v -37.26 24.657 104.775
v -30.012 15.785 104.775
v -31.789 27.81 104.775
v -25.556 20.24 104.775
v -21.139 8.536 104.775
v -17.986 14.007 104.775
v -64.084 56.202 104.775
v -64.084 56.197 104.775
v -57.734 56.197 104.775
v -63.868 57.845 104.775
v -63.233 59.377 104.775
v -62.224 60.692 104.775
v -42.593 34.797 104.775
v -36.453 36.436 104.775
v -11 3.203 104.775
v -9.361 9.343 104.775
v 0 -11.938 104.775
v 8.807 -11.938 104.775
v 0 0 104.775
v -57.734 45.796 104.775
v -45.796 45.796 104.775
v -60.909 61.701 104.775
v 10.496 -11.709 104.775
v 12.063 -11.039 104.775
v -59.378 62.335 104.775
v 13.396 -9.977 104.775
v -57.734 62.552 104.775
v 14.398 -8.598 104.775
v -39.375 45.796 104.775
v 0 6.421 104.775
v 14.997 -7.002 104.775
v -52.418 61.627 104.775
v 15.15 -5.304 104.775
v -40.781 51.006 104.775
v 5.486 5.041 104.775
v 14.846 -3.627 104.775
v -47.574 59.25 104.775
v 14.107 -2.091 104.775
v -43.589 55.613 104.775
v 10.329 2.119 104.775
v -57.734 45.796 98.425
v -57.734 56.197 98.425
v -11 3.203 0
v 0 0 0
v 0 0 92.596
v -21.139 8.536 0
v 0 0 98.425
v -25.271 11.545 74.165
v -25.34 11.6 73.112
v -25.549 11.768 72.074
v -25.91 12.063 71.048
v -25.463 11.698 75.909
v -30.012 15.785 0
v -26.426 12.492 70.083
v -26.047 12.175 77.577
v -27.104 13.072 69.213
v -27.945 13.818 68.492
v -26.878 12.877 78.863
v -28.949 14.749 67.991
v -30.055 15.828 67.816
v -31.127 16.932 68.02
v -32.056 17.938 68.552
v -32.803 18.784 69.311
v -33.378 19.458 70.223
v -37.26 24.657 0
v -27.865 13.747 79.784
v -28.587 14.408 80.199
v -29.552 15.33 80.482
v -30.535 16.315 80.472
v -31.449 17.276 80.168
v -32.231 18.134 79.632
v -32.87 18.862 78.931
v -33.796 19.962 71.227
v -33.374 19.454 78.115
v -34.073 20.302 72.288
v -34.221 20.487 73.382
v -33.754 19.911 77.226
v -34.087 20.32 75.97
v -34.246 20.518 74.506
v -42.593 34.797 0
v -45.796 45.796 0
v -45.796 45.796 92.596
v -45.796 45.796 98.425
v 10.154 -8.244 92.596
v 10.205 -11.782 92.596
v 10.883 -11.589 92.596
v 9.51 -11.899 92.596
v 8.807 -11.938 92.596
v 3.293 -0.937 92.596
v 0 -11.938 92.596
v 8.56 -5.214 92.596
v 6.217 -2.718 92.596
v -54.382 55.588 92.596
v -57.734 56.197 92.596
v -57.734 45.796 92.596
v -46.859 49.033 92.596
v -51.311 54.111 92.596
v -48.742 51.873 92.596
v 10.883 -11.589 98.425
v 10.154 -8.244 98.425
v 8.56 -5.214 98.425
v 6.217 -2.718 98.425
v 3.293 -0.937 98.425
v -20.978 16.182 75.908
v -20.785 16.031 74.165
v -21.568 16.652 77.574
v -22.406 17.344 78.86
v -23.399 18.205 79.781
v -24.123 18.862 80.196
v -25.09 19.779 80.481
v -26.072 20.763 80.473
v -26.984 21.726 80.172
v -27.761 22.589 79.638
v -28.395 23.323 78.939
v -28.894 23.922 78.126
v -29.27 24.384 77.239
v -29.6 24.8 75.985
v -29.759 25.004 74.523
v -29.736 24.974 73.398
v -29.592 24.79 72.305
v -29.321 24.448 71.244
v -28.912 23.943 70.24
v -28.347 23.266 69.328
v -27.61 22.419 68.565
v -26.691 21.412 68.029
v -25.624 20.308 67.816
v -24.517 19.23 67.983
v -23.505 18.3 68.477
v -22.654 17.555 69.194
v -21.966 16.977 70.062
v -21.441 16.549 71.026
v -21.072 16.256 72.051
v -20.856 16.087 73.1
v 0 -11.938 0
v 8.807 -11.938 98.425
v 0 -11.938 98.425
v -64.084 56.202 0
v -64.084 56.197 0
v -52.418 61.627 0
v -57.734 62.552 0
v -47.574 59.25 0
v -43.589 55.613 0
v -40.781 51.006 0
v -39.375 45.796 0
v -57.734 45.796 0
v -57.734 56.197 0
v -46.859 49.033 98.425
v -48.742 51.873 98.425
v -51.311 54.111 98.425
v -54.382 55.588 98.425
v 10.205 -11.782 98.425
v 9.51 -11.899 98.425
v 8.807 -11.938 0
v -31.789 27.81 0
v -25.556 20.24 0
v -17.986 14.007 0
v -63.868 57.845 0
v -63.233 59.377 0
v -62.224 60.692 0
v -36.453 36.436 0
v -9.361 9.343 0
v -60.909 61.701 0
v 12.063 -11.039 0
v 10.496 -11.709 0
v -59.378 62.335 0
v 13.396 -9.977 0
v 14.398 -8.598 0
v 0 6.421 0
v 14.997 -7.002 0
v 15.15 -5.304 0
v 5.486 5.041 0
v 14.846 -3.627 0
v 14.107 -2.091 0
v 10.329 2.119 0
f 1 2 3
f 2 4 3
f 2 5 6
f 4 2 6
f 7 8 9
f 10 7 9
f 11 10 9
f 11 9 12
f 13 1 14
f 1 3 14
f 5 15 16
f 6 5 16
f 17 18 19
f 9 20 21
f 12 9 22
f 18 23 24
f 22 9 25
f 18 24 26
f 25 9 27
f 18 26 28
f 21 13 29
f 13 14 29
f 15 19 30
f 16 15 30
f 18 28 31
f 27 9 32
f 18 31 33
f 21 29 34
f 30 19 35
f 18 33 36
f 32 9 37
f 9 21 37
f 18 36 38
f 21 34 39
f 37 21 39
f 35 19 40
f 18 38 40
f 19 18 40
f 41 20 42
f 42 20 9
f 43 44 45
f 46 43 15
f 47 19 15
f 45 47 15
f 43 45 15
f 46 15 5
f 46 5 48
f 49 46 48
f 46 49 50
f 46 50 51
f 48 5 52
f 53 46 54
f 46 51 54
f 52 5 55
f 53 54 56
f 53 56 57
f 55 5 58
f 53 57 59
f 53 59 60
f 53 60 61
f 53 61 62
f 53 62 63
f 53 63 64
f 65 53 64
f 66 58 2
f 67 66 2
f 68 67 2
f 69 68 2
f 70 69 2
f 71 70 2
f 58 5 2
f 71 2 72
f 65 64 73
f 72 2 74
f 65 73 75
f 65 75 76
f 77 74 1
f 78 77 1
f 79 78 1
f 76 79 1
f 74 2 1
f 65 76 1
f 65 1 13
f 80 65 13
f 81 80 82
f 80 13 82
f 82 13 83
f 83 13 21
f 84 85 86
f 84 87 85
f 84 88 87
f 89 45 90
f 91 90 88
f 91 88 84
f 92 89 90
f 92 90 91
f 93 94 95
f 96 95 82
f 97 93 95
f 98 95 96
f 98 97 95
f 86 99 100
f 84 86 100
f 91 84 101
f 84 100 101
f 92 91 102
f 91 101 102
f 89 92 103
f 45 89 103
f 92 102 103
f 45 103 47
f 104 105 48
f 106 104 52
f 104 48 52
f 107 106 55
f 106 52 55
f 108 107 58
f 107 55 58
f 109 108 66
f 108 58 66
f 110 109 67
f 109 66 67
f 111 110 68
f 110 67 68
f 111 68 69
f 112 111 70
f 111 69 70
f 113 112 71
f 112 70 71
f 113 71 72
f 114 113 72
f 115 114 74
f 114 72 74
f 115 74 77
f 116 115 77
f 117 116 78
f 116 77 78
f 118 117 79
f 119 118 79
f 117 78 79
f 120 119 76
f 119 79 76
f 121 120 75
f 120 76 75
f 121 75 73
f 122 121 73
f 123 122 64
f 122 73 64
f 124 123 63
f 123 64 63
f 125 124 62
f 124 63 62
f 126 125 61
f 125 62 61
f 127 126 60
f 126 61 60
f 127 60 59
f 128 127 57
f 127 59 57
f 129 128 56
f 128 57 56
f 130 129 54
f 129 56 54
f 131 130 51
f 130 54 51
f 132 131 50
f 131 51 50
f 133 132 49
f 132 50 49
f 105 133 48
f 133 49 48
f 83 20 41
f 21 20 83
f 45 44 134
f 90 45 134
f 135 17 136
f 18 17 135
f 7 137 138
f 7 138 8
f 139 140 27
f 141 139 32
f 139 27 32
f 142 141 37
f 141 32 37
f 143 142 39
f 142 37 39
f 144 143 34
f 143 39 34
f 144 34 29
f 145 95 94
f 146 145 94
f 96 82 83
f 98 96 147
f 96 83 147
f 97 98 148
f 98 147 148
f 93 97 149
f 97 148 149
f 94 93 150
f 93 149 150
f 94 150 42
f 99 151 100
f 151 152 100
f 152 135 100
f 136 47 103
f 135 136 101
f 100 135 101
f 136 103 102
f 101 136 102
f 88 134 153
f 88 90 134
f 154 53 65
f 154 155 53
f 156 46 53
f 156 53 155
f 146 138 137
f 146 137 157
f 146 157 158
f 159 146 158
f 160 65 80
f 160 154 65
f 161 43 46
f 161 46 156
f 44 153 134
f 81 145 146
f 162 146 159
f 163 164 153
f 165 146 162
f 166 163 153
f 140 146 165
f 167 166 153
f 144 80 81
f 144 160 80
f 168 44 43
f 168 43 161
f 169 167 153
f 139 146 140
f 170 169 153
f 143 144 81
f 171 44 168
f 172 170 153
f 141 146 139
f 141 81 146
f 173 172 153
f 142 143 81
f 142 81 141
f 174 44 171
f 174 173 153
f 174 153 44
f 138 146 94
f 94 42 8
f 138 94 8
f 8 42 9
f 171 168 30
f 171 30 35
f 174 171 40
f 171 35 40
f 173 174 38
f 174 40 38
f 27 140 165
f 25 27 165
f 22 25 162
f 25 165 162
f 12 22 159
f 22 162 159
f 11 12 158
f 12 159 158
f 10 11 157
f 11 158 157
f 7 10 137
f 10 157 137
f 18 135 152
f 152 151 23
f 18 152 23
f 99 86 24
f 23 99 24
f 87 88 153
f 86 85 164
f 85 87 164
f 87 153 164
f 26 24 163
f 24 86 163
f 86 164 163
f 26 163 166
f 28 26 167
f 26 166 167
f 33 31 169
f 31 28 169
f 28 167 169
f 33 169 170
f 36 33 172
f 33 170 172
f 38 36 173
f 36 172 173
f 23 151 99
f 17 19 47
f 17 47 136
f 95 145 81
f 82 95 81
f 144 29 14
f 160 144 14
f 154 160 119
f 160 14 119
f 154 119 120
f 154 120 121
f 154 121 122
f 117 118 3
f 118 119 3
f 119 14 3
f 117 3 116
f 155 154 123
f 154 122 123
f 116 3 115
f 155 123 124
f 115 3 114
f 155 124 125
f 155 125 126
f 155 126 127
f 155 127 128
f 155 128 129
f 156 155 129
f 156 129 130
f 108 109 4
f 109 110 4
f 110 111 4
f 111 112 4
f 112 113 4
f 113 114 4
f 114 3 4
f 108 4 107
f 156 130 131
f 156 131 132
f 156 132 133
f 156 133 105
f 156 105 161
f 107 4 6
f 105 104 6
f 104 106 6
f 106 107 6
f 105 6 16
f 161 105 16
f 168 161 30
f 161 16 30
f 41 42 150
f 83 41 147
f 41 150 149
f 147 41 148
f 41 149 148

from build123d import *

# Parameters (mm, degrees)
BOSS_EXTRUDE1_DEPTH = 104.775
BOSS_EXTRUDE2_DEPTH = 92.5957
BOSS_EXTRUDE3_START = -5.8293
BOSS_EXTRUDE3_DEPTH = 5.8293
BOSS_EXTRUDE4_DEPTH = 6.35
SKETCH5_W           = 7.787485422
SKETCH5_H           = 19.833751934
SKETCH5_W_2         = 22.754058967
SKETCH5_H_2         = 3.407024872
CUT_EXTRUDE1_DEPTH  = 227.312030137
SKETCH6_R           = 6.35
CUT_EXTRUDE2_DEPTH  = 6.35
SKETCH7_W           = 111.054240747
SKETCH7_H           = 89.646194338
CUT_EXTRUDE3_DEPTH  = 104.775
SKETCH8_W           = 104.775
SKETCH8_H           = 6.354337814
BOSS_EXTRUDE5_DEPTH = 6.35
FILLET1_R           = 6.35


with BuildPart() as part:
    # Sketch1 → Boss-Extrude1 (new, symmetric)
    with BuildSketch(Plane.XY):
        with BuildLine():
            Line((-58.2422, 56.2102), (-58.2422, 62.5602))
            ThreePointArc((-58.2422, 62.5602), (-45.640852469, 57.743322347), (-39.3748699, 45.7962))
            ThreePointArc((-39.3748699, 45.7962), (-25.556268964, 20.239931036), (0, 6.4213301))
            ThreePointArc((0, 6.4213301), (12.247457496, 0.293755183), (17.272, -12.446))
            Line((17.272, -12.446), (10.922, -12.446))
            ThreePointArc((10.922, -12.446), (7.760938146, -4.204686933), (0, 0))
            ThreePointArc((0, 0), (-30.011530905, 15.784669095), (-45.7962, 45.7962))
            ThreePointArc((-45.7962, 45.7962), (-50.144819563, 53.243313205), (-58.2422, 56.2102))
        make_face()
    extrude(amount=BOSS_EXTRUDE1_DEPTH, both=True)


with BuildPart() as boss_extrude2_tool:
    # Sketch2 → Boss-Extrude2 (new, symmetric)
    with BuildSketch(Plane.XY):
        with BuildLine():
            Line((-58.2422, 56.2102), (-58.2422, 45.796198296))
            Line((-58.2422, 45.796198296), (-45.796199685, 45.796198296))
            ThreePointArc((-45.796199685, 45.796198296), (-50.144818899, 53.243312648), (-58.2422, 56.2102))
        make_face()
        with BuildLine():
            Line((0, 0), (0, -12.446))
            Line((0, -12.446), (10.922, -12.446))
            ThreePointArc((10.922, -12.446), (7.760938146, -4.204686933), (0, 0))
        make_face()
    extrude(amount=BOSS_EXTRUDE2_DEPTH, both=True)


with BuildPart() as part_1:
    add(part.part)


with BuildPart() as part_2:
    # Boss-Extrude2: joined with boss_extrude2_tool
    add(part_1.part.fuse(boss_extrude2_tool.part, tol=0.00001))

    # Sketch3 → Boss-Extrude3 (add)
    with BuildSketch(Plane(origin=(0, 0, -104.775), x_dir=(-1, 0, 0), z_dir=(0, 0, -1)).offset(BOSS_EXTRUDE3_START)):
        with BuildLine():
            Line((58.2422, 56.2102), (58.2422, 45.796198296))
            Line((58.2422, 45.796198296), (45.7962, 45.7962))
            ThreePointArc((45.7962, 45.7962), (50.144819563, 53.243313205), (58.2422, 56.2102))
        make_face()
        with BuildLine():
            Line((0, 0), (0, -12.446))
            Line((0, -12.446), (-10.922, -12.446))
            ThreePointArc((-10.922, -12.446), (-7.760938146, -4.204686933), (0, 0))
        make_face()
    extrude(amount=BOSS_EXTRUDE3_DEPTH)

    # Sketch4 → Boss-Extrude4 (add)
    with BuildSketch(Plane.XY.offset(104.775)):
        with BuildLine():
            Line((-58.2422, 56.2102), (-58.2422, 45.796198296))
            Line((-58.2422, 45.796198296), (-45.7962, 45.7962))
            ThreePointArc((-45.7962, 45.7962), (-50.144819563, 53.243313205), (-58.2422, 56.2102))
        make_face()
        with BuildLine():
            Line((0, 0), (0, -12.446))
            Line((0, -12.446), (10.922, -12.446))
            ThreePointArc((10.922, -12.446), (7.760938146, -4.204686933), (0, 0))
        make_face()
    extrude(amount=-BOSS_EXTRUDE4_DEPTH)

    # Sketch5 → Cut-Extrude1 (cut, through all)
    with BuildSketch(Plane.XY.offset(104.775)):
        with Locations((-61.627942711, 54.680509116)):
            Rectangle(SKETCH5_W, SKETCH5_H)
        with Locations((8.225058429, -13.641512436)):
            Rectangle(SKETCH5_W_2, SKETCH5_H_2)
    extrude(amount=-CUT_EXTRUDE1_DEPTH, mode=Mode.SUBTRACT)

    # Sketch6 → Cut-Extrude2 (cut, symmetric)
    with BuildSketch(Plane(origin=(-5.969, -5.969000176, 0), x_dir=(-0.7071067916239179, 0.7071067707491772, 0), z_dir=(-0.7071067707491772, -0.7071067916239179, 0))):
        with Locations(Location((32.382802858, -74.165398348, 0), (0, 0, 180))):
            Circle(SKETCH6_R)
    extrude(amount=CUT_EXTRUDE2_DEPTH, both=True, mode=Mode.SUBTRACT)

    # Sketch7 → Cut-Extrude3 (cut)
    with BuildSketch(Plane(origin=(0, 0, -104.775), x_dir=(-1, 0, 0), z_dir=(0, 0, -1))):
        with Locations((26.053941981, 26.416451063)):
            Rectangle(SKETCH7_W, SKETCH7_H)
    extrude(amount=-CUT_EXTRUDE3_DEPTH, mode=Mode.SUBTRACT)

    # Sketch8 → Boss-Extrude5 (add)
    with BuildSketch(Plane.ZY.offset(57.7342)):
        with Locations((52.3875, 59.374341949)):
            Rectangle(SKETCH8_W, SKETCH8_H)
    extrude(amount=BOSS_EXTRUDE5_DEPTH)

    # Fillet1
    # the kernel refuses this fillet: 6.35 mm, written as the material it takes off along each edge
    with BuildSketch(Plane(origin=(-64.0842, 62.551510856, -15.875), x_dir=(1, 0, 0), z_dir=(0, 0, 1))) as fillet1_piece_1:
        with BuildLine():
            CenterArc((FILLET1_R, -FILLET1_R), FILLET1_R, 90, 90)
            Line((0, -FILLET1_R), (0, 0))
            Line((0, 0), (FILLET1_R, 0))
        make_face()
    extrude(amount=136.525, mode=Mode.SUBTRACT)
    with BuildSketch(Plane(origin=(17.260151367, -11.938, -25.849178653), x_dir=(-0.30497213299383213, 0.9523612749882223, 0), z_dir=(0, 0, 1))) as fillet1_piece_2:
        with BuildLine():
            CenterArc((8.625598356, 6.114282737), FILLET1_R, 162.243512631, 123.416753829)
            Line((2.57810426, 8.050855782), (0, 0))
            ThreePointArc((0, 0), (5.169835731, -0.710949564), (10.339671461, 0))
        make_face()
    extrude(amount=156.473357306, mode=Mode.SUBTRACT)


solid = part_2.part
